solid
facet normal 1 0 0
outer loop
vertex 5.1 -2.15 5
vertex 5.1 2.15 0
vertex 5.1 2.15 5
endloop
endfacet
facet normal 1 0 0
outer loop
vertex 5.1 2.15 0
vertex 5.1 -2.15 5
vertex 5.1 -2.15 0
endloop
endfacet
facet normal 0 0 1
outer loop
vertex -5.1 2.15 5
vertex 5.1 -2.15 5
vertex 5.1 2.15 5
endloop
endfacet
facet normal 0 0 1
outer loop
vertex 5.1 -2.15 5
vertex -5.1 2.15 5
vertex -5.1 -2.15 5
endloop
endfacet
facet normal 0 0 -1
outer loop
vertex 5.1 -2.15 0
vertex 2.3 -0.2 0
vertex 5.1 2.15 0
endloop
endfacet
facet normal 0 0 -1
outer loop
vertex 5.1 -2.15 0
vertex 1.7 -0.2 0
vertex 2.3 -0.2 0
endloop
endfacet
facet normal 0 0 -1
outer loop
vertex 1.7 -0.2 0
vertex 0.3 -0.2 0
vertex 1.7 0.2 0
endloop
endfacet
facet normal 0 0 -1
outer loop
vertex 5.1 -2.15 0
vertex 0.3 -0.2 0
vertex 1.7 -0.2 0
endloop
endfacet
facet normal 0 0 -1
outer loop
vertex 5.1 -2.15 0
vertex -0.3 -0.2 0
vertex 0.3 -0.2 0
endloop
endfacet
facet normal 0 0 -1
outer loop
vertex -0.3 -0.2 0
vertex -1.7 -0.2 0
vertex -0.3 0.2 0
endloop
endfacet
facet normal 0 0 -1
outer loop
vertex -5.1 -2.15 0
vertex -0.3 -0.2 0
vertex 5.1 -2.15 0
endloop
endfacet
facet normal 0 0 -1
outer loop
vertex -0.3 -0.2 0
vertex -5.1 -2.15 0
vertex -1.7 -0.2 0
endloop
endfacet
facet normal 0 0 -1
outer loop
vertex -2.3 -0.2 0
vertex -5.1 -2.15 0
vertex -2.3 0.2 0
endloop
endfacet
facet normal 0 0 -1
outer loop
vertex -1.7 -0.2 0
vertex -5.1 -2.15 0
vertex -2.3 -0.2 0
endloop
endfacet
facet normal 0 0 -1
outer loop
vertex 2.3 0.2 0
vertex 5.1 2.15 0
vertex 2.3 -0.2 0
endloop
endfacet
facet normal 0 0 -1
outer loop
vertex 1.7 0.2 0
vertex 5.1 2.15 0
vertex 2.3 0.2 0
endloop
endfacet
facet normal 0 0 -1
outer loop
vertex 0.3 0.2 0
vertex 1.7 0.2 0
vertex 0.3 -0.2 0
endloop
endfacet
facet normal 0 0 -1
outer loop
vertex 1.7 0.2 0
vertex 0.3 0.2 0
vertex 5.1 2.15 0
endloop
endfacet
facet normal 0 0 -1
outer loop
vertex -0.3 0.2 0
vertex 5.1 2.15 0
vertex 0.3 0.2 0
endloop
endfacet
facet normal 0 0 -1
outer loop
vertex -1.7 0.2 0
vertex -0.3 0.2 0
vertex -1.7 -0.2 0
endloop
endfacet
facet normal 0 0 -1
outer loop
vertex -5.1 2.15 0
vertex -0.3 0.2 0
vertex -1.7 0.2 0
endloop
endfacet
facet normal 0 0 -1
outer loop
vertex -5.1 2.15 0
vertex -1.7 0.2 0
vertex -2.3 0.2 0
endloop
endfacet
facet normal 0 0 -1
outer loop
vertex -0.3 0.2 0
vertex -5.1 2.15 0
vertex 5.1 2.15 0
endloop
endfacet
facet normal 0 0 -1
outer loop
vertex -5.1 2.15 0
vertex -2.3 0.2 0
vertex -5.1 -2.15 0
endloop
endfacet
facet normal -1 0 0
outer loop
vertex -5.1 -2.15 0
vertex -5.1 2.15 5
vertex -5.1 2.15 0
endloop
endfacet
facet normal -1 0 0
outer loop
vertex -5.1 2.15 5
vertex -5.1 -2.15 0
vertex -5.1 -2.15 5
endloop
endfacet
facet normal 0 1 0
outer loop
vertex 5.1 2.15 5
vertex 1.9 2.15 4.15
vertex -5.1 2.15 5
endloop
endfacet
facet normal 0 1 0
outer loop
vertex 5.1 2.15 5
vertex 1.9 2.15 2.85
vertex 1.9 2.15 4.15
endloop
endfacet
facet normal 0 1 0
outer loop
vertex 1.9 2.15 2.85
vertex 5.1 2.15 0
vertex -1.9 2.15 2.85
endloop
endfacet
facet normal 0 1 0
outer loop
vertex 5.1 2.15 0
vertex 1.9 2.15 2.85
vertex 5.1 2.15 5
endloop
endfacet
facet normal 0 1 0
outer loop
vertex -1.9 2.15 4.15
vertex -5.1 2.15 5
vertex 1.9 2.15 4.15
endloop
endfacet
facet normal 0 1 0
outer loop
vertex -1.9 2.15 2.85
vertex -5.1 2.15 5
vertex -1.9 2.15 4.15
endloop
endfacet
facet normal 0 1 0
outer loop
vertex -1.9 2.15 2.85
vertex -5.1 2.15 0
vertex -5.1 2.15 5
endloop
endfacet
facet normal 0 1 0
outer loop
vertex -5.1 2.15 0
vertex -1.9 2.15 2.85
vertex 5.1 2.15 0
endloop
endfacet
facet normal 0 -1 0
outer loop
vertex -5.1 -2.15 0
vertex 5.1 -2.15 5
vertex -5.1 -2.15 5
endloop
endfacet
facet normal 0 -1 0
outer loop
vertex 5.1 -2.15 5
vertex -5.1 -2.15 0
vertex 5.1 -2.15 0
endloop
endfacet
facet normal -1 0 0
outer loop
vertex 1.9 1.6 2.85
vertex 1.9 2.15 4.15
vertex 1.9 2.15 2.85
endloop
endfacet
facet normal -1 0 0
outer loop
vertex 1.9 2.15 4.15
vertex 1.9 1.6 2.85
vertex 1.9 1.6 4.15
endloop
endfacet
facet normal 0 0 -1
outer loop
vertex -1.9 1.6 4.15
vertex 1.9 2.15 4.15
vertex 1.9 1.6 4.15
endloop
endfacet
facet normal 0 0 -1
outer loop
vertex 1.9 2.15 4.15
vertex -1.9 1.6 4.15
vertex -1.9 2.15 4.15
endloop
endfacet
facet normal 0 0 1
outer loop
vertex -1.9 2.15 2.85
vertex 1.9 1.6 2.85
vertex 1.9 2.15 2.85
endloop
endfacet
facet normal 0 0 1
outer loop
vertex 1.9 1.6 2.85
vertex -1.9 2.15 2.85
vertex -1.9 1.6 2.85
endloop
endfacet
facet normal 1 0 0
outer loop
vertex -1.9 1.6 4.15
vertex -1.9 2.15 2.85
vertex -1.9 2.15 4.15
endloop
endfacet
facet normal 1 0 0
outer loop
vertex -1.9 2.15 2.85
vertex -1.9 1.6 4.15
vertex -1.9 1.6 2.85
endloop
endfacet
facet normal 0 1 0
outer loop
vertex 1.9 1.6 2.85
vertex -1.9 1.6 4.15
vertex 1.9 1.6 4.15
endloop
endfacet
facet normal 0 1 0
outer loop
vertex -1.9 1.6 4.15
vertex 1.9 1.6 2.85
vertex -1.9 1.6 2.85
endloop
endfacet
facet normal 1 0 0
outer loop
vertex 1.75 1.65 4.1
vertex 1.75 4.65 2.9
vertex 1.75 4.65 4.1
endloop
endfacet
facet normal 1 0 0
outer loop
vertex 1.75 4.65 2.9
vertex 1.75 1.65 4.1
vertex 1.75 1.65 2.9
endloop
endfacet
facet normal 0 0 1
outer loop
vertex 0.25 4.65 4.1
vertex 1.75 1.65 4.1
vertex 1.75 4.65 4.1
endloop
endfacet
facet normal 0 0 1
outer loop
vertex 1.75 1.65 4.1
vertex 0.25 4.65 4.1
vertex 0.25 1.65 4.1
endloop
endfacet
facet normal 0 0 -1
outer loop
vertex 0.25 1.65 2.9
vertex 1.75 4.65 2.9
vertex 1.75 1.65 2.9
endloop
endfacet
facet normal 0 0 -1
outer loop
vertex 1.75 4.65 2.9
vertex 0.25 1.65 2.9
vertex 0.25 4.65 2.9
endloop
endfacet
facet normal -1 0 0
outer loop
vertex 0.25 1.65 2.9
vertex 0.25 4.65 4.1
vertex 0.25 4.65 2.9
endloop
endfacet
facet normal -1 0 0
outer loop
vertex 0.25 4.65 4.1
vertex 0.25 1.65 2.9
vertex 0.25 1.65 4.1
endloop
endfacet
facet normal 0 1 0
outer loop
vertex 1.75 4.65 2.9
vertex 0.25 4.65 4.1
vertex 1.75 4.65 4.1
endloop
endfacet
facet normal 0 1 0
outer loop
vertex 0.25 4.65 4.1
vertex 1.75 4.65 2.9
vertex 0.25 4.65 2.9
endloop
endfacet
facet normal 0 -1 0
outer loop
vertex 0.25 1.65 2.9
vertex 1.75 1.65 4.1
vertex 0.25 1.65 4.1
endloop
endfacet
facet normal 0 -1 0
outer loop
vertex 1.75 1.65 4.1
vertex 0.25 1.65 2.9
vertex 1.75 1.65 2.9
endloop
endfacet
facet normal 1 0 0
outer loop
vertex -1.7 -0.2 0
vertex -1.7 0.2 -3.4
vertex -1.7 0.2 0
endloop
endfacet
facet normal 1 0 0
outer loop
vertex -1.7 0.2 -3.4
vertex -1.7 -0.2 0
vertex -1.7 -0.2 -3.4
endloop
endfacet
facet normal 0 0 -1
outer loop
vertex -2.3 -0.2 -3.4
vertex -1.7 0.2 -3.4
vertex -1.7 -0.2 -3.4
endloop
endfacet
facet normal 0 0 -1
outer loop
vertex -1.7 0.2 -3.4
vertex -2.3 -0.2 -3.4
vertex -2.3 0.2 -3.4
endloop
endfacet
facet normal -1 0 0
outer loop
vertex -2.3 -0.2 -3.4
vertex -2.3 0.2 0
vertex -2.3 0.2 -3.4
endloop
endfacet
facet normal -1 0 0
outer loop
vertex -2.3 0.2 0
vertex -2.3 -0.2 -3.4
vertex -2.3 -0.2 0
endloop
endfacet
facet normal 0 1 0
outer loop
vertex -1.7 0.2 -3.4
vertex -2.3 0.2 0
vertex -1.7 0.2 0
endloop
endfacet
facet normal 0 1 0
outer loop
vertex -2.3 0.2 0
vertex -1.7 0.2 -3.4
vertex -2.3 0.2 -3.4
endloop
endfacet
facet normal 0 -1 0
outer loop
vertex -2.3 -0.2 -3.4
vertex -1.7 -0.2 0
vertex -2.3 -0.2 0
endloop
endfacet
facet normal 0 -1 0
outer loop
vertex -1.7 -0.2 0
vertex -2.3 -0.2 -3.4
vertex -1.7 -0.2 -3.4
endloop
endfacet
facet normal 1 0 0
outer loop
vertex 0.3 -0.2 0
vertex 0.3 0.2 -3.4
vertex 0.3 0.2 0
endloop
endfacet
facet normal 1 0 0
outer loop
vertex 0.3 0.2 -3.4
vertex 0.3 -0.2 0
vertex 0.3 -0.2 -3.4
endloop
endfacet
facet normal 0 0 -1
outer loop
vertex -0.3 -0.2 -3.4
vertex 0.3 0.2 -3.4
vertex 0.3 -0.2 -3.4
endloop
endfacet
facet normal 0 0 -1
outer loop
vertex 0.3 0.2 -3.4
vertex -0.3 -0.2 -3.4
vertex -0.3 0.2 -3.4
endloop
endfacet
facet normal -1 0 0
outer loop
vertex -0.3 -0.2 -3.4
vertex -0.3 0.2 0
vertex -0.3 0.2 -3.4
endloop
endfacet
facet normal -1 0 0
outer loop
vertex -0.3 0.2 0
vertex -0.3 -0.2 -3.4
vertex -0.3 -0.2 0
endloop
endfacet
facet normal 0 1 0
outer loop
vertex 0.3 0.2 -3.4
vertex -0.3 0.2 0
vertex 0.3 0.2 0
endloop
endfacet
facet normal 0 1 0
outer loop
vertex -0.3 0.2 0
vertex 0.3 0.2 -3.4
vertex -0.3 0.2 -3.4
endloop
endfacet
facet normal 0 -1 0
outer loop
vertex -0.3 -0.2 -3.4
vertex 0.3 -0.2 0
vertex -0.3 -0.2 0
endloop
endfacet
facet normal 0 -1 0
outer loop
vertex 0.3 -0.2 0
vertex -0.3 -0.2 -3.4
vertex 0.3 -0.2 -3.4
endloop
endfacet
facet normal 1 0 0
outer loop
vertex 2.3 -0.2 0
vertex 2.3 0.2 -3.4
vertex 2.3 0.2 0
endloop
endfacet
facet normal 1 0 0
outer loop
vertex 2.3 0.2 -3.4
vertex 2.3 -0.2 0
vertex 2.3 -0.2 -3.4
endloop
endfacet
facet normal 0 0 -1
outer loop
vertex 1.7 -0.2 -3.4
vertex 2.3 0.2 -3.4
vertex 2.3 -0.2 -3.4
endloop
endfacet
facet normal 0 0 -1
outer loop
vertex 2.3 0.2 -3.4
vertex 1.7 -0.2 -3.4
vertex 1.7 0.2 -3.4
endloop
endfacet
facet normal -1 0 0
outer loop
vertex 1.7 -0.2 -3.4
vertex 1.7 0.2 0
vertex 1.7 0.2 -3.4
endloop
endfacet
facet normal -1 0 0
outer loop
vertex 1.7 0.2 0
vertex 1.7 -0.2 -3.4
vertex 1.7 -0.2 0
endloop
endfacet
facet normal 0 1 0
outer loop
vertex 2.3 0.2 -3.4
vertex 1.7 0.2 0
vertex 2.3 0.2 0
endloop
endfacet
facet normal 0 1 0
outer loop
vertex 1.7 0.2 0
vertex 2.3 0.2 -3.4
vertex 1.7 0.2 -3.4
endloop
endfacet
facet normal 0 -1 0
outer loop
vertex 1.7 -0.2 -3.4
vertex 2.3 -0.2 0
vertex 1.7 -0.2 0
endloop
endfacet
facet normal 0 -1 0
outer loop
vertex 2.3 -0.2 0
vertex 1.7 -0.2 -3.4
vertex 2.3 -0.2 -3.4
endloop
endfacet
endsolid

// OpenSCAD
/*
 * Create a Tyco Electronics Right-Sngle Through-Hole Slide switch

 * Author: Ian McInerney
 * Created: June 22, 2013
 *
 */

// An individual pin
module pin() {
	translate([0.0,0.0,-1.7])cube(size=[0.6,0.4,3.4], center=true);
}

// Main switch body
difference() {
	// The main switch rectangle
	translate([0.0,0.0,2.5])cube(size=[10.2,4.3,5.0], center=true);
	
	// The cutout where the switch lever goes
	translate([0.0,2.1,3.5])cube(size=[3.8,1.0,1.3], center=true);
}

// The switch lever
translate([1.0,3.15,3.5])cube(size=[1.5,2.5+0.5,1.2], center=true);

// The pins
translate([-2.0,0.0,0.0])pin();
translate([0.0,0.0,0.0])pin();
translate([2.0,0.0,0.0])pin();
